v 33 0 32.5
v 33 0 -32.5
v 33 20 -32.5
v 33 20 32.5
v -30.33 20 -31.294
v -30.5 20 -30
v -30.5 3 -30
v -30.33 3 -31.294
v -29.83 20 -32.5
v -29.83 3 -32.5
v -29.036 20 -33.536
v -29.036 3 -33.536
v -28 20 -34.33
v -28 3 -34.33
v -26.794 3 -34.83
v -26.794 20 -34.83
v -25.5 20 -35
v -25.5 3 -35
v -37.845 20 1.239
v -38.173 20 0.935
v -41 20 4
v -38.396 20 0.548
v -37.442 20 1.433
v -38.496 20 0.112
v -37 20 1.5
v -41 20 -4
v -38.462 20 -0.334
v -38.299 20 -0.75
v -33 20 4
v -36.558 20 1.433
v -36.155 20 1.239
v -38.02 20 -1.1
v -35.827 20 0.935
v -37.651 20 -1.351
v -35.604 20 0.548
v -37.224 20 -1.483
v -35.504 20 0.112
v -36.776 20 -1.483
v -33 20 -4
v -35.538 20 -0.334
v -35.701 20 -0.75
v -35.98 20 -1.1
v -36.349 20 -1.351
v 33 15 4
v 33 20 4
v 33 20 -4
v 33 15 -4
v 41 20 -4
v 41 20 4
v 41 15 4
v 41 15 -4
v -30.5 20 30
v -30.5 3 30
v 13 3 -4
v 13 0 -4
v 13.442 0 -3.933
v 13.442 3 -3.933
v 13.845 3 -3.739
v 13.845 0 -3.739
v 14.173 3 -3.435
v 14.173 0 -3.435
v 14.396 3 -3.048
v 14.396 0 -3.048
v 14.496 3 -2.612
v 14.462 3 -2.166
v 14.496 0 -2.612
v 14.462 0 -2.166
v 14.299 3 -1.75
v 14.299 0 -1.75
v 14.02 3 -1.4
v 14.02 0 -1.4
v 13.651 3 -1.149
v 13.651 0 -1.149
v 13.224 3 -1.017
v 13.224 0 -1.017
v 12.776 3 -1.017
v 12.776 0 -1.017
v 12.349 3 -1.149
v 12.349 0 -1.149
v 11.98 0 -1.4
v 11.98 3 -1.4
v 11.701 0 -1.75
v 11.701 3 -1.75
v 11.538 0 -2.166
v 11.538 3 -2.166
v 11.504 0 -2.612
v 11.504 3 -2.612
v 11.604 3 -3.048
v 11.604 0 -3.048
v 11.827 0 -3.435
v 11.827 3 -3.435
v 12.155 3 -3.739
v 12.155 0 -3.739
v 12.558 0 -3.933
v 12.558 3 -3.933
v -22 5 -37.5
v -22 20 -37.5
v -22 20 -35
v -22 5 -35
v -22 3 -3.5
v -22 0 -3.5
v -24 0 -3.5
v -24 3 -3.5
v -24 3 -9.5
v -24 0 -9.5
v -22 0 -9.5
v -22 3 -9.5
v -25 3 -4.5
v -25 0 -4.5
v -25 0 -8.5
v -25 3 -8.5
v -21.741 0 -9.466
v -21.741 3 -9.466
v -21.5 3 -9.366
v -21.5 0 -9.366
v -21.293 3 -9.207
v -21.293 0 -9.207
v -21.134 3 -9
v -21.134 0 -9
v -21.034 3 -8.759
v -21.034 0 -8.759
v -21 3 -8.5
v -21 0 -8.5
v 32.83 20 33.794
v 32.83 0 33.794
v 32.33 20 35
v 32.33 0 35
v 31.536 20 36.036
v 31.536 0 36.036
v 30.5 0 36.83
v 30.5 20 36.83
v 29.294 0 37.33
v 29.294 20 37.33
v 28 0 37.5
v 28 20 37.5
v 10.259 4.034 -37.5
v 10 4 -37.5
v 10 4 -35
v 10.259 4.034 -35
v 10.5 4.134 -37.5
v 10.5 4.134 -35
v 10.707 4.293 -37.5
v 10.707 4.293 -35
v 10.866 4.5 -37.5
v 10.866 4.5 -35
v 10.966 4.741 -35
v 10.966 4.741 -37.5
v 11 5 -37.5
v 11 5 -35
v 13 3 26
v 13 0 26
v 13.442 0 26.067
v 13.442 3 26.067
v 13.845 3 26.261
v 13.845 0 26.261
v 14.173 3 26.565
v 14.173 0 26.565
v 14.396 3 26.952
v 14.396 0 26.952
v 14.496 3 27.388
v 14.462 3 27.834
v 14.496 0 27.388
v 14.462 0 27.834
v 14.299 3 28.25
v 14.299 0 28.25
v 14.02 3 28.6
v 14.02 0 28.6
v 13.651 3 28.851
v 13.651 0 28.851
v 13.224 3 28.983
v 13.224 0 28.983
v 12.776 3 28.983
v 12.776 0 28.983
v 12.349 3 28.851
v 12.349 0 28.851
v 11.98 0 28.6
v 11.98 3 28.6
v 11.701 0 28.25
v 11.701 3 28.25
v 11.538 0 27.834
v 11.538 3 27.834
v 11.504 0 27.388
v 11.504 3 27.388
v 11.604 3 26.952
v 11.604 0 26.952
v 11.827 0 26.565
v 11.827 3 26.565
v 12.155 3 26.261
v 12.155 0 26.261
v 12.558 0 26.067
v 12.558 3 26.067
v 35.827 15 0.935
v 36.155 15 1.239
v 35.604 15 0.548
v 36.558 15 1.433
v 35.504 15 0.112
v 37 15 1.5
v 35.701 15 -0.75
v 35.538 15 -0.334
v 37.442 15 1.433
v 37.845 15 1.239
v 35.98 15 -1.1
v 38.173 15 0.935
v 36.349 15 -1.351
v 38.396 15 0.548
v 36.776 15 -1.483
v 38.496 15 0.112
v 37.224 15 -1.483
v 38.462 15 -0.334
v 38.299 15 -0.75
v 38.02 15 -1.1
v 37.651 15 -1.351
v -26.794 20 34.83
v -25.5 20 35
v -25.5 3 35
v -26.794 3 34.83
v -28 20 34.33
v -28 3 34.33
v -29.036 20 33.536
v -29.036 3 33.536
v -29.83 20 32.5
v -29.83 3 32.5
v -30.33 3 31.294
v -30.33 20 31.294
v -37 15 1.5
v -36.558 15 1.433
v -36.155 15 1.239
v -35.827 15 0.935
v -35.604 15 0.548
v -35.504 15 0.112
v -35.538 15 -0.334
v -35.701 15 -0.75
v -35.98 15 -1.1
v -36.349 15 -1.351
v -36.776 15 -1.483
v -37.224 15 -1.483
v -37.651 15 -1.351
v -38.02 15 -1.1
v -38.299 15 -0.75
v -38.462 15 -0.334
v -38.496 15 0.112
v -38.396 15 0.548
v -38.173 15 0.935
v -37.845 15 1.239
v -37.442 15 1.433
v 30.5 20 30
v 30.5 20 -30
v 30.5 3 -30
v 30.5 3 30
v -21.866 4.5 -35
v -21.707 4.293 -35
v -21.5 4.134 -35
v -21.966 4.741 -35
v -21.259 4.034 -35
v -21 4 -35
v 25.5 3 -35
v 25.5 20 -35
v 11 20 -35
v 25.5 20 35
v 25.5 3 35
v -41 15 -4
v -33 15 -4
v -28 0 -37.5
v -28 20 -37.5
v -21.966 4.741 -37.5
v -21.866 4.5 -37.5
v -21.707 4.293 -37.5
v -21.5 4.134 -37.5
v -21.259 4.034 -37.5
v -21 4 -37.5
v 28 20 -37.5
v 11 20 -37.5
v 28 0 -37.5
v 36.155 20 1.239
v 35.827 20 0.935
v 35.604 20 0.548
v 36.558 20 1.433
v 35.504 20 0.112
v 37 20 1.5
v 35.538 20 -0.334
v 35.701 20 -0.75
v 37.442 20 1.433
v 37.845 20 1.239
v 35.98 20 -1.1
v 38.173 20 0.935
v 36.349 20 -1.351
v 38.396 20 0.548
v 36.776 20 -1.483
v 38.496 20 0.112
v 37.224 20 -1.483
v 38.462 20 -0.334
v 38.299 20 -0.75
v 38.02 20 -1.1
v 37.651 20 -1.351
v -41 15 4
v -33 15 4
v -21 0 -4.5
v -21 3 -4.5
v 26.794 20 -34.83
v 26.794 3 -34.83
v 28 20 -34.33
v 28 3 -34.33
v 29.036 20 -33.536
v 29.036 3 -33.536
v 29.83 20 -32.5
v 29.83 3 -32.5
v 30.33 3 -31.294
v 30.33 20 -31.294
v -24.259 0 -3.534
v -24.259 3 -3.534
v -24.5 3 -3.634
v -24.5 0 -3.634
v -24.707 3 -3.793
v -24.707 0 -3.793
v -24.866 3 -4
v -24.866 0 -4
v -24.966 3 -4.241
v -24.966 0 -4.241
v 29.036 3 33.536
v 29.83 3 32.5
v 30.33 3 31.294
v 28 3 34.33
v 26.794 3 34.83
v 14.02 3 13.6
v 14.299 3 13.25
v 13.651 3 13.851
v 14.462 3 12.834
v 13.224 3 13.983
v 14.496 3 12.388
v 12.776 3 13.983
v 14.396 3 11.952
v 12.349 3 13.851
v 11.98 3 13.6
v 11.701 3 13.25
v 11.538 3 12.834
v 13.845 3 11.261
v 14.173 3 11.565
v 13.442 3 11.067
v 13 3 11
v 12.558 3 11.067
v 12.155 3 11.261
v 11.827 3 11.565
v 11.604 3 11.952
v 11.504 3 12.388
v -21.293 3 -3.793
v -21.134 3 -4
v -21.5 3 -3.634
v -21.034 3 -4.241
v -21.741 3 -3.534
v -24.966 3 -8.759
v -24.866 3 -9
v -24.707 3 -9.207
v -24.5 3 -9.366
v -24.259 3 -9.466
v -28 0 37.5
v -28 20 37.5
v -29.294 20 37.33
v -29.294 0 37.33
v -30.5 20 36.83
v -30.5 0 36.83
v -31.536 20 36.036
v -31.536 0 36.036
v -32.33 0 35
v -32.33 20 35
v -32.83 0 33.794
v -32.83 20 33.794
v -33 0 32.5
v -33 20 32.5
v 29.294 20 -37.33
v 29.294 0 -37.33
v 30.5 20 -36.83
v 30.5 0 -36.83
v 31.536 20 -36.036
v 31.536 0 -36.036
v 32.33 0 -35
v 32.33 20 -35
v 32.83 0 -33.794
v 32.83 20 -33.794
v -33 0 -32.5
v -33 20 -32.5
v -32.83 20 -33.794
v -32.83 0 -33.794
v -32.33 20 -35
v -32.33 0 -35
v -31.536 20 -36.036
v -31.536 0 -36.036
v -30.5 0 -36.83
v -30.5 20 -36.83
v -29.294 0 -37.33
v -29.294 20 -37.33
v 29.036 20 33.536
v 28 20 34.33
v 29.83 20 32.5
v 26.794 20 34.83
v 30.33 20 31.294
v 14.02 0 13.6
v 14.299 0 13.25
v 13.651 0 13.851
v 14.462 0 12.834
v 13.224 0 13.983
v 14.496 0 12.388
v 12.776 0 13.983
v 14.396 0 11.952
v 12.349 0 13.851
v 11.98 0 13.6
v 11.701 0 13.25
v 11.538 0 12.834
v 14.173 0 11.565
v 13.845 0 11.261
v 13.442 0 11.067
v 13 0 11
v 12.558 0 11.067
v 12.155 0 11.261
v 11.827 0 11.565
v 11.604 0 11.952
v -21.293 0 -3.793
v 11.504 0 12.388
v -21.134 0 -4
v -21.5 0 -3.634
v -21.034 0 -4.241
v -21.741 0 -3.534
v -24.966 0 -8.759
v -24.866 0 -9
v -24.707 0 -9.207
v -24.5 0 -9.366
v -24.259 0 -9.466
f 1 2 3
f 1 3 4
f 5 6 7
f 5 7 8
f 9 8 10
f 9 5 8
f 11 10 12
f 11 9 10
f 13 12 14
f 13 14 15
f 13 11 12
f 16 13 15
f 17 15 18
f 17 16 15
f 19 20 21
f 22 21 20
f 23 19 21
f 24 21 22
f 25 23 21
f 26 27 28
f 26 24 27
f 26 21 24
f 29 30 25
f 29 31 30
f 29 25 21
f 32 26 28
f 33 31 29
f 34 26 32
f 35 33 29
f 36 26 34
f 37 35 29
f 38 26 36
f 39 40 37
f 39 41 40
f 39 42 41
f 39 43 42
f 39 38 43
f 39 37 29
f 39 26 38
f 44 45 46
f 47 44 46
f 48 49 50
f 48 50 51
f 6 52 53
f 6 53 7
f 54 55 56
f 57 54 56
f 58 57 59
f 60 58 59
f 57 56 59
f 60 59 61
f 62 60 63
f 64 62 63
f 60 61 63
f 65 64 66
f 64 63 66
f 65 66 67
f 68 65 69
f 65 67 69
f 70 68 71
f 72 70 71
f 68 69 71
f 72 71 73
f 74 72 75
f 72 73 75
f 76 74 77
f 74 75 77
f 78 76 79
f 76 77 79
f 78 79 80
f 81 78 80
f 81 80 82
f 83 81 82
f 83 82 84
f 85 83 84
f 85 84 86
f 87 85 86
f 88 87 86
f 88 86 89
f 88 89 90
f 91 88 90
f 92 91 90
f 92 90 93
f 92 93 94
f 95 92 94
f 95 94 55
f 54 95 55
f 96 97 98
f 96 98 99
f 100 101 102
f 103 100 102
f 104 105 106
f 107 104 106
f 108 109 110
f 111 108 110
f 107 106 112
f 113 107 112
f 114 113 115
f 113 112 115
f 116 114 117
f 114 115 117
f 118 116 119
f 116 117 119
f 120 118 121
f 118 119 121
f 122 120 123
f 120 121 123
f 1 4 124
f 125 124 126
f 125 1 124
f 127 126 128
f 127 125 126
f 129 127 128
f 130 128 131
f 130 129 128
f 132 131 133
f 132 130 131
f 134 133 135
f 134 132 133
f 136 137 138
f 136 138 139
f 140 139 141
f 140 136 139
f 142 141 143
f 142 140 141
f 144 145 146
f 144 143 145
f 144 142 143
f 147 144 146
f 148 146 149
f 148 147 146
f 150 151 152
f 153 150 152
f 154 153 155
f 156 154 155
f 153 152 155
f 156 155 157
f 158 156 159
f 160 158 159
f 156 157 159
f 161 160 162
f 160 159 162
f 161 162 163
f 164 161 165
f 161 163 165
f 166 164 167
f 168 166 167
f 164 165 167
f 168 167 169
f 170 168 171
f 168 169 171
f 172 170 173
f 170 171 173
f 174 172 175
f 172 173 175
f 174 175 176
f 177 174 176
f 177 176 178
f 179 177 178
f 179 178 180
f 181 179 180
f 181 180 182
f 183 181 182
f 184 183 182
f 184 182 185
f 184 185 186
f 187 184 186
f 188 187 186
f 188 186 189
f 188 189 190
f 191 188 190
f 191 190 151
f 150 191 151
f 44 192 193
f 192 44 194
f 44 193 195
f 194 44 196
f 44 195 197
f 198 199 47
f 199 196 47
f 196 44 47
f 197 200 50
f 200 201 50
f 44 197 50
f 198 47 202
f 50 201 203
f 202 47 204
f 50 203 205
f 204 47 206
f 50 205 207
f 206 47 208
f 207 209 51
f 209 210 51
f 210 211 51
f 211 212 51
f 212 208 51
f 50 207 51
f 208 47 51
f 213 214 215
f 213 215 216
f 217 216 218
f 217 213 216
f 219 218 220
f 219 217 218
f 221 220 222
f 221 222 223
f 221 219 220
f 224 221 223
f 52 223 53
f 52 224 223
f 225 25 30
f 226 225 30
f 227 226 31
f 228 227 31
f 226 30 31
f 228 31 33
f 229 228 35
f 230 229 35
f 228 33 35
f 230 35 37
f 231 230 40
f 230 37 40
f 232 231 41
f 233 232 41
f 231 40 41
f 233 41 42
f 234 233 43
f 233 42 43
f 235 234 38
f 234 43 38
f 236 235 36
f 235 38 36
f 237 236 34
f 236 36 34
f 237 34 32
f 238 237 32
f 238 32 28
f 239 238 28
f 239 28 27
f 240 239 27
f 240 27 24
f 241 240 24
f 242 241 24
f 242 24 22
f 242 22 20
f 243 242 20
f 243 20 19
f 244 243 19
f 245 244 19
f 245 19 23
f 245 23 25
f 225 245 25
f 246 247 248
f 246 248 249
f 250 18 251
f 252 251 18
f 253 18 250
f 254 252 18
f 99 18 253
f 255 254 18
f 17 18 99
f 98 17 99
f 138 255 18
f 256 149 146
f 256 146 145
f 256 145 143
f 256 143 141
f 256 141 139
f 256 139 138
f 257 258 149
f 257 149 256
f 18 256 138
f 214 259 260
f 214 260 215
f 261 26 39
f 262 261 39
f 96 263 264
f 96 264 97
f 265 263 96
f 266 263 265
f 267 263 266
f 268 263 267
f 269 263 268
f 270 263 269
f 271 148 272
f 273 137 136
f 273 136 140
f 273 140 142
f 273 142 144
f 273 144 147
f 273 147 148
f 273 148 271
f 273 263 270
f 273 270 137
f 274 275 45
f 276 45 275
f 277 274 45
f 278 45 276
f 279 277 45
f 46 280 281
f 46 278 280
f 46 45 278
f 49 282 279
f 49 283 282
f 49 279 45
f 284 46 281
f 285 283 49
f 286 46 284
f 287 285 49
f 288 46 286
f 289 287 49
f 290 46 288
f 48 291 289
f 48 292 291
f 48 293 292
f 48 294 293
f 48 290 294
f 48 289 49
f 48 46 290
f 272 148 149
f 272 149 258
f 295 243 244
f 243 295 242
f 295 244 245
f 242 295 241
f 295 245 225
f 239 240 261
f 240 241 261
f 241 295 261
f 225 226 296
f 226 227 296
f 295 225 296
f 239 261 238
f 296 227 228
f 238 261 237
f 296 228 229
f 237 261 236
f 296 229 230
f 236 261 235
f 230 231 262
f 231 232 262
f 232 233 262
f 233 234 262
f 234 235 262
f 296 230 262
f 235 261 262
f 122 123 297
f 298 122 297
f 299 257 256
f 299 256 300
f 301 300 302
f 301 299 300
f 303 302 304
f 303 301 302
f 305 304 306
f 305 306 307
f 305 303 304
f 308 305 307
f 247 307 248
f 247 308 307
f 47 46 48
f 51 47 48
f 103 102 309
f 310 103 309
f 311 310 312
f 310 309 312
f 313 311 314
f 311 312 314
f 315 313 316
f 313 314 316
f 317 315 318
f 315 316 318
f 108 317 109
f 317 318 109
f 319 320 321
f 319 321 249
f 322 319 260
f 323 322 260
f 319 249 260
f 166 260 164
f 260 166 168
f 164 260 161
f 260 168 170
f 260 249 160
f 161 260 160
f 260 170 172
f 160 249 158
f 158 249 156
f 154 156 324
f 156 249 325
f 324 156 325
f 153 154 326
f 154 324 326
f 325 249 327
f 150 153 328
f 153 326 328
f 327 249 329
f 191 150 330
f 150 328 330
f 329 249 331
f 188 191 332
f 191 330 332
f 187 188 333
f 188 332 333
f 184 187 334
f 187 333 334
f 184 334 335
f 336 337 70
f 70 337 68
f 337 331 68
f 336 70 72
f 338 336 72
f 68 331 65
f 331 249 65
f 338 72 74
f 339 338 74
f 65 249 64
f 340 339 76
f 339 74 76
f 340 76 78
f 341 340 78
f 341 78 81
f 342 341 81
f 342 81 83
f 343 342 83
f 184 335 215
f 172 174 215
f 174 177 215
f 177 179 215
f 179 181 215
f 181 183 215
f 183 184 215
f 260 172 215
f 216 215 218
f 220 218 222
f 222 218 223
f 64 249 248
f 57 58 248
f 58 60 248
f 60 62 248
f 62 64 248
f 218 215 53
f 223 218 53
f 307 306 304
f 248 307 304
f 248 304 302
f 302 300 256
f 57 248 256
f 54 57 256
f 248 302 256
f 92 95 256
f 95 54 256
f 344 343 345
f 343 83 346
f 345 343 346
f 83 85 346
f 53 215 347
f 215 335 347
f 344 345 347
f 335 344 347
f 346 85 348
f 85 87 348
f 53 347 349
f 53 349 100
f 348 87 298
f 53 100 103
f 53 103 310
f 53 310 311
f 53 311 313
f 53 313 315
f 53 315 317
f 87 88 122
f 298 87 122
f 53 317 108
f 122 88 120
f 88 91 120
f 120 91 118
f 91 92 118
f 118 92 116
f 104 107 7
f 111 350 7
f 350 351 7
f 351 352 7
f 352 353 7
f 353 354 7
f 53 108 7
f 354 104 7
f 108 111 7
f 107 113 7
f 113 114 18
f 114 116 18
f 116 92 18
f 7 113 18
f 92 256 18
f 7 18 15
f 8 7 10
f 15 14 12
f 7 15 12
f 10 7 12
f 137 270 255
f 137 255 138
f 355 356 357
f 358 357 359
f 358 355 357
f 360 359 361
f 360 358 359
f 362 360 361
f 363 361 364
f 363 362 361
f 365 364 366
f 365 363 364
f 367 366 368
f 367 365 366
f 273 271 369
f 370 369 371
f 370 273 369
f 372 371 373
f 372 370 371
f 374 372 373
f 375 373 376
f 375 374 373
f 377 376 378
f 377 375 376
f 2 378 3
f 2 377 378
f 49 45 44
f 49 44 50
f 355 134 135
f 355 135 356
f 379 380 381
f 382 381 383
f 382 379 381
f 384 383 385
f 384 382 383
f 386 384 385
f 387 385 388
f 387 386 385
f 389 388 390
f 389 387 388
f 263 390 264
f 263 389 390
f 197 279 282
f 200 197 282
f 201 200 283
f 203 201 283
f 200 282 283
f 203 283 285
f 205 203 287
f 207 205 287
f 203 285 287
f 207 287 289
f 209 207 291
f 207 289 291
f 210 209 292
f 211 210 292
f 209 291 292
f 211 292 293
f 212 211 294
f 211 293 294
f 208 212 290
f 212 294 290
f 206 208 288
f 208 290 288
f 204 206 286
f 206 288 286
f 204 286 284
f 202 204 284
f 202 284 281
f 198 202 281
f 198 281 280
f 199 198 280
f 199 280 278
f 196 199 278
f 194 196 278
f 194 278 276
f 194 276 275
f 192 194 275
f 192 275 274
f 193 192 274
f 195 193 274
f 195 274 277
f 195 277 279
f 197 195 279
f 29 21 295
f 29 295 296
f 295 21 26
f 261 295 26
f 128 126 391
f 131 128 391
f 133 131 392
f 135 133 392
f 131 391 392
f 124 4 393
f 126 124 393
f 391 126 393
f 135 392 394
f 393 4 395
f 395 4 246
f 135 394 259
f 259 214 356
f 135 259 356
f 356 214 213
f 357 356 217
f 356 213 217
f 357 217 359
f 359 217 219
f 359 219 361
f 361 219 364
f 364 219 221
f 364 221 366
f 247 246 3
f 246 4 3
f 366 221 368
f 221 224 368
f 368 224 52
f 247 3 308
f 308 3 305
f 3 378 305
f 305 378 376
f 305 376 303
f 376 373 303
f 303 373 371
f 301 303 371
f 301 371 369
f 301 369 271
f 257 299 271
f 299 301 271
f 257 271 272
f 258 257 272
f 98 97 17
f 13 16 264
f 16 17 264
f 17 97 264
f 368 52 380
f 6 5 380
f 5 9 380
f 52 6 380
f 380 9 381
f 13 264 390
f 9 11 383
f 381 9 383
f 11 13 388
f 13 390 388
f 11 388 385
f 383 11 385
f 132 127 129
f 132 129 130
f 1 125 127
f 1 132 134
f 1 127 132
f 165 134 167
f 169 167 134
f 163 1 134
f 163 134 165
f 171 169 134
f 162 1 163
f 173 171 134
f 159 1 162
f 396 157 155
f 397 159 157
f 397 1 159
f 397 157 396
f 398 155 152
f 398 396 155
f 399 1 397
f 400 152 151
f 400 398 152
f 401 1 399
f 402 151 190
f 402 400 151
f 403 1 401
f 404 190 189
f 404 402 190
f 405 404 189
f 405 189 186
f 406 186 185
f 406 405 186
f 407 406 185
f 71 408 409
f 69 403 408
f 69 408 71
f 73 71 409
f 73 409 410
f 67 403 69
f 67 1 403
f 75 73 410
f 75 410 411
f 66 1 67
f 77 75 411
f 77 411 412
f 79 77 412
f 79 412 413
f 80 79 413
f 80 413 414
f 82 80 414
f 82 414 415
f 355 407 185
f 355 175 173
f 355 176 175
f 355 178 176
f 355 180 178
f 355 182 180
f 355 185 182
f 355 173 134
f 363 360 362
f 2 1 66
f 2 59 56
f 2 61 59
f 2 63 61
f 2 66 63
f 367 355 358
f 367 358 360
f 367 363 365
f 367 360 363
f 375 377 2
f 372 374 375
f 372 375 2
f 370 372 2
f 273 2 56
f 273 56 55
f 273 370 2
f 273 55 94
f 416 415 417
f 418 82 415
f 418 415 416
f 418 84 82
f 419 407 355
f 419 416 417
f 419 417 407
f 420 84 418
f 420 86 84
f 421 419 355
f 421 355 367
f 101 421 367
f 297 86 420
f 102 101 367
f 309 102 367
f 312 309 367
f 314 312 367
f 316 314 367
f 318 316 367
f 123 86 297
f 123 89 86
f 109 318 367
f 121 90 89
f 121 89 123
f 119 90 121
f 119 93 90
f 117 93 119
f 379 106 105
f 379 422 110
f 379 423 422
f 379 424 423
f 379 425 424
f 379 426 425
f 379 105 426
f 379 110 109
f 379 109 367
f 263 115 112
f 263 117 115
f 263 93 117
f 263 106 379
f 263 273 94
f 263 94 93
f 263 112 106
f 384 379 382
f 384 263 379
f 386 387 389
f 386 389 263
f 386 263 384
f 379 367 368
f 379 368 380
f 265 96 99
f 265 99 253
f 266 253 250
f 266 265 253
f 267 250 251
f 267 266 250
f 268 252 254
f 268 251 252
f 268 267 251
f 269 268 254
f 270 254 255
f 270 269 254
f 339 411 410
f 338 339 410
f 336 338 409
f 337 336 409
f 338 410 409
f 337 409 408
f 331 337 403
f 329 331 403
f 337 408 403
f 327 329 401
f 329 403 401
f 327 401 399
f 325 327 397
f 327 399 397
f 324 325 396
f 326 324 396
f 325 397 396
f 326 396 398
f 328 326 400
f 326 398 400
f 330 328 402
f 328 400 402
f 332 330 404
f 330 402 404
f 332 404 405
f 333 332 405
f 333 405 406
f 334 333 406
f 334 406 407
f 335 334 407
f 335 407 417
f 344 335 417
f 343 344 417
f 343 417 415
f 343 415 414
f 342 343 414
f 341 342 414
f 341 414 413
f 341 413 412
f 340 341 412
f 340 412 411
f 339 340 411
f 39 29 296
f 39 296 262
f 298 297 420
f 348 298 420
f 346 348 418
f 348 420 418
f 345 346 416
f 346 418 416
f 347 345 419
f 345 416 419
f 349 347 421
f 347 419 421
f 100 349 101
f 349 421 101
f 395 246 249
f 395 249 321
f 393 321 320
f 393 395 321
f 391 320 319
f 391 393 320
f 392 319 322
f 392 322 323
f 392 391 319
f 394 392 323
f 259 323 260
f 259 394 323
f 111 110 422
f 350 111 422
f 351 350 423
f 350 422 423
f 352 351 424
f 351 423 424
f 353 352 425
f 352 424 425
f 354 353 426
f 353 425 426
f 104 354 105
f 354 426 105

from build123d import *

# Parameters (mm, degrees)
AUFSATZ_LINEAR_AUSTRAGEN1_DEPTH   = 20
SCHNITT_LINEAR_AUSTRAGEN1_DEPTH   = 17
SCHNITT_LINEAR_AUSTRAGEN2_DEPTH   = 32
SCHNITT_LINEAR_AUSTRAGEN3_DEPTH   = 17
SKIZZE5_R                         = 1.5
SCHNITT_LINEAR_AUSTRAGEN4_DEPTH   = 17
SKIZZE7_W                         = 8
SKIZZE7_H                         = 8
AUFSATZ_LINEAR_AUSTRAGEN2_DEPTH   = 5
AUFSATZ_LINEAR_AUSTRAGEN2_2_DEPTH = 5
SKIZZE8_R                         = 1.5
SCHNITT_LINEAR_AUSTRAGEN6_DEPTH   = 10
SKIZZE9_R                         = 1.5
SCHNITT_LINEAR_AUSTRAGEN7_DEPTH   = 10


with BuildPart() as part:
    # Skizze1 → Aufsatz-Linear austragen1 (new body)
    with BuildSketch(Plane(origin=(0, 0, 0), x_dir=(1, 0, 0), z_dir=(0, 1, 0))):
        with BuildLine():
            Line((28, -37.5), (-28, -37.5))
            ThreePointArc((-28, -37.5), (-31.535533906, -36.035533906), (-33, -32.5))
            Line((-33, -32.5), (-33, 32.5))
            ThreePointArc((-33, 32.5), (-31.535533906, 36.035533906), (-28, 37.5))
            Line((-28, 37.5), (28, 37.5))
            ThreePointArc((28, 37.5), (31.535533906, 36.035533906), (33, 32.5))
            Line((33, 32.5), (33, -32.5))
            ThreePointArc((33, -32.5), (31.535533906, -36.035533906), (28, -37.5))
        make_face()
    extrude(amount=AUFSATZ_LINEAR_AUSTRAGEN1_DEPTH)

    # Skizze2 → Schnitt-Linear austragen1 (cut)
    with BuildSketch(Plane(origin=(0, 20, 0), x_dir=(1, 0, 0), z_dir=(0, 1, 0))):
        with BuildLine():
            Line((25.5, -35), (-25.5, -35))
            ThreePointArc((-25.5, -35), (-29.035533906, -33.535533906), (-30.5, -30))
            Line((-30.5, -30), (-30.5, 30))
            ThreePointArc((-30.5, 30), (-29.035533906, 33.535533906), (-25.5, 35))
            Line((-25.5, 35), (25.5, 35))
            ThreePointArc((25.5, 35), (29.035533906, 33.535533906), (30.5, 30))
            Line((30.5, 30), (30.5, -30))
            ThreePointArc((30.5, -30), (29.035533906, -33.535533906), (25.5, -35))
        make_face()
    extrude(amount=-SCHNITT_LINEAR_AUSTRAGEN1_DEPTH, mode=Mode.SUBTRACT)

    # Skizze3 → Schnitt-Linear austragen2 (cut)
    with BuildSketch(Plane(origin=(0, 0, -37.5), x_dir=(-1, 0, 0), z_dir=(0, 0, -1))):
        with BuildLine():
            Line((-10, 22), (21, 22))
            ThreePointArc((21, 22), (21.707106781, 21.707106781), (22, 21))
            Line((22, 21), (22, 5))
            ThreePointArc((22, 5), (21.707106781, 4.292893219), (21, 4))
            Line((21, 4), (-10, 4))
            ThreePointArc((-10, 4), (-10.707106781, 4.292893219), (-11, 5))
            Line((-11, 5), (-11, 21))
            ThreePointArc((-11, 21), (-10.707106781, 21.707106781), (-10, 22))
        make_face()
    extrude(amount=-SCHNITT_LINEAR_AUSTRAGEN2_DEPTH, mode=Mode.SUBTRACT)

    # Skizze4 → Schnitt-Linear austragen3 (cut)
    with BuildSketch(Plane.XZ):
        with BuildLine():
            Line((-22, -3.5), (-24, -3.5))
            ThreePointArc((-24, -3.5), (-24.707106781, -3.792893219), (-25, -4.5))
            Line((-25, -4.5), (-25, -8.5))
            ThreePointArc((-25, -8.5), (-24.707106781, -9.207106781), (-24, -9.5))
            Line((-24, -9.5), (-22, -9.5))
            ThreePointArc((-22, -9.5), (-21.292893219, -9.207106781), (-21, -8.5))
            Line((-21, -8.5), (-21, -4.5))
            ThreePointArc((-21, -4.5), (-21.292893219, -3.792893219), (-22, -3.5))
        make_face()
    extrude(amount=-SCHNITT_LINEAR_AUSTRAGEN3_DEPTH, mode=Mode.SUBTRACT)

    # Skizze5 → Schnitt-Linear austragen4 (cut)
    with BuildSketch(Plane.XZ):
        with Locations(Location((13, -2.5, 0), (0, 0, 270))):
            Circle(SKIZZE5_R)
        with Locations(Location((13, 27.5, 0), (0, 0, 270))):
            Circle(SKIZZE5_R)
        with Locations(Location((13, 12.5, 0), (0, 0, 270))):
            Circle(SKIZZE5_R)
    extrude(amount=-SCHNITT_LINEAR_AUSTRAGEN4_DEPTH, mode=Mode.SUBTRACT)


with BuildPart() as body_2:
    # Skizze7 → Aufsatz-Linear austragen2 (new body)
    with BuildSketch(Plane(origin=(0, 20, 0), x_dir=(1, 0, 0), z_dir=(0, 1, 0))):
        with Locations((37, 0)):
            Rectangle(SKIZZE7_W, SKIZZE7_H)
    extrude(amount=-AUFSATZ_LINEAR_AUSTRAGEN2_DEPTH)

    # Skizze9 → Schnitt-Linear austragen7 (cut)
    with BuildSketch(Plane(origin=(0, 20, 0), x_dir=(1, 0, 0), z_dir=(0, 1, 0))):
        with Locations(Location((37, 0, 0), (0, 0, 270))):
            Circle(SKIZZE9_R)
    extrude(amount=-SCHNITT_LINEAR_AUSTRAGEN7_DEPTH, mode=Mode.SUBTRACT)


with BuildPart() as body_3:
    # Skizze7 → Aufsatz-Linear austragen2 2 (new body)
    with BuildSketch(Plane(origin=(0, 20, 0), x_dir=(1, 0, 0), z_dir=(0, 1, 0))):
        with Locations((-37, 0)):
            Rectangle(SKIZZE7_W, SKIZZE7_H)
    extrude(amount=-AUFSATZ_LINEAR_AUSTRAGEN2_2_DEPTH)

    # Skizze8 → Schnitt-Linear austragen6 (cut)
    with BuildSketch(Plane(origin=(0, 20, 0), x_dir=(1, 0, 0), z_dir=(0, 1, 0))):
        with Locations(Location((-37, 0, 0), (0, 0, 270))):
            Circle(SKIZZE8_R)
    extrude(amount=-SCHNITT_LINEAR_AUSTRAGEN6_DEPTH, mode=Mode.SUBTRACT)


solid = Compound([part.part, body_2.part, body_3.part])
